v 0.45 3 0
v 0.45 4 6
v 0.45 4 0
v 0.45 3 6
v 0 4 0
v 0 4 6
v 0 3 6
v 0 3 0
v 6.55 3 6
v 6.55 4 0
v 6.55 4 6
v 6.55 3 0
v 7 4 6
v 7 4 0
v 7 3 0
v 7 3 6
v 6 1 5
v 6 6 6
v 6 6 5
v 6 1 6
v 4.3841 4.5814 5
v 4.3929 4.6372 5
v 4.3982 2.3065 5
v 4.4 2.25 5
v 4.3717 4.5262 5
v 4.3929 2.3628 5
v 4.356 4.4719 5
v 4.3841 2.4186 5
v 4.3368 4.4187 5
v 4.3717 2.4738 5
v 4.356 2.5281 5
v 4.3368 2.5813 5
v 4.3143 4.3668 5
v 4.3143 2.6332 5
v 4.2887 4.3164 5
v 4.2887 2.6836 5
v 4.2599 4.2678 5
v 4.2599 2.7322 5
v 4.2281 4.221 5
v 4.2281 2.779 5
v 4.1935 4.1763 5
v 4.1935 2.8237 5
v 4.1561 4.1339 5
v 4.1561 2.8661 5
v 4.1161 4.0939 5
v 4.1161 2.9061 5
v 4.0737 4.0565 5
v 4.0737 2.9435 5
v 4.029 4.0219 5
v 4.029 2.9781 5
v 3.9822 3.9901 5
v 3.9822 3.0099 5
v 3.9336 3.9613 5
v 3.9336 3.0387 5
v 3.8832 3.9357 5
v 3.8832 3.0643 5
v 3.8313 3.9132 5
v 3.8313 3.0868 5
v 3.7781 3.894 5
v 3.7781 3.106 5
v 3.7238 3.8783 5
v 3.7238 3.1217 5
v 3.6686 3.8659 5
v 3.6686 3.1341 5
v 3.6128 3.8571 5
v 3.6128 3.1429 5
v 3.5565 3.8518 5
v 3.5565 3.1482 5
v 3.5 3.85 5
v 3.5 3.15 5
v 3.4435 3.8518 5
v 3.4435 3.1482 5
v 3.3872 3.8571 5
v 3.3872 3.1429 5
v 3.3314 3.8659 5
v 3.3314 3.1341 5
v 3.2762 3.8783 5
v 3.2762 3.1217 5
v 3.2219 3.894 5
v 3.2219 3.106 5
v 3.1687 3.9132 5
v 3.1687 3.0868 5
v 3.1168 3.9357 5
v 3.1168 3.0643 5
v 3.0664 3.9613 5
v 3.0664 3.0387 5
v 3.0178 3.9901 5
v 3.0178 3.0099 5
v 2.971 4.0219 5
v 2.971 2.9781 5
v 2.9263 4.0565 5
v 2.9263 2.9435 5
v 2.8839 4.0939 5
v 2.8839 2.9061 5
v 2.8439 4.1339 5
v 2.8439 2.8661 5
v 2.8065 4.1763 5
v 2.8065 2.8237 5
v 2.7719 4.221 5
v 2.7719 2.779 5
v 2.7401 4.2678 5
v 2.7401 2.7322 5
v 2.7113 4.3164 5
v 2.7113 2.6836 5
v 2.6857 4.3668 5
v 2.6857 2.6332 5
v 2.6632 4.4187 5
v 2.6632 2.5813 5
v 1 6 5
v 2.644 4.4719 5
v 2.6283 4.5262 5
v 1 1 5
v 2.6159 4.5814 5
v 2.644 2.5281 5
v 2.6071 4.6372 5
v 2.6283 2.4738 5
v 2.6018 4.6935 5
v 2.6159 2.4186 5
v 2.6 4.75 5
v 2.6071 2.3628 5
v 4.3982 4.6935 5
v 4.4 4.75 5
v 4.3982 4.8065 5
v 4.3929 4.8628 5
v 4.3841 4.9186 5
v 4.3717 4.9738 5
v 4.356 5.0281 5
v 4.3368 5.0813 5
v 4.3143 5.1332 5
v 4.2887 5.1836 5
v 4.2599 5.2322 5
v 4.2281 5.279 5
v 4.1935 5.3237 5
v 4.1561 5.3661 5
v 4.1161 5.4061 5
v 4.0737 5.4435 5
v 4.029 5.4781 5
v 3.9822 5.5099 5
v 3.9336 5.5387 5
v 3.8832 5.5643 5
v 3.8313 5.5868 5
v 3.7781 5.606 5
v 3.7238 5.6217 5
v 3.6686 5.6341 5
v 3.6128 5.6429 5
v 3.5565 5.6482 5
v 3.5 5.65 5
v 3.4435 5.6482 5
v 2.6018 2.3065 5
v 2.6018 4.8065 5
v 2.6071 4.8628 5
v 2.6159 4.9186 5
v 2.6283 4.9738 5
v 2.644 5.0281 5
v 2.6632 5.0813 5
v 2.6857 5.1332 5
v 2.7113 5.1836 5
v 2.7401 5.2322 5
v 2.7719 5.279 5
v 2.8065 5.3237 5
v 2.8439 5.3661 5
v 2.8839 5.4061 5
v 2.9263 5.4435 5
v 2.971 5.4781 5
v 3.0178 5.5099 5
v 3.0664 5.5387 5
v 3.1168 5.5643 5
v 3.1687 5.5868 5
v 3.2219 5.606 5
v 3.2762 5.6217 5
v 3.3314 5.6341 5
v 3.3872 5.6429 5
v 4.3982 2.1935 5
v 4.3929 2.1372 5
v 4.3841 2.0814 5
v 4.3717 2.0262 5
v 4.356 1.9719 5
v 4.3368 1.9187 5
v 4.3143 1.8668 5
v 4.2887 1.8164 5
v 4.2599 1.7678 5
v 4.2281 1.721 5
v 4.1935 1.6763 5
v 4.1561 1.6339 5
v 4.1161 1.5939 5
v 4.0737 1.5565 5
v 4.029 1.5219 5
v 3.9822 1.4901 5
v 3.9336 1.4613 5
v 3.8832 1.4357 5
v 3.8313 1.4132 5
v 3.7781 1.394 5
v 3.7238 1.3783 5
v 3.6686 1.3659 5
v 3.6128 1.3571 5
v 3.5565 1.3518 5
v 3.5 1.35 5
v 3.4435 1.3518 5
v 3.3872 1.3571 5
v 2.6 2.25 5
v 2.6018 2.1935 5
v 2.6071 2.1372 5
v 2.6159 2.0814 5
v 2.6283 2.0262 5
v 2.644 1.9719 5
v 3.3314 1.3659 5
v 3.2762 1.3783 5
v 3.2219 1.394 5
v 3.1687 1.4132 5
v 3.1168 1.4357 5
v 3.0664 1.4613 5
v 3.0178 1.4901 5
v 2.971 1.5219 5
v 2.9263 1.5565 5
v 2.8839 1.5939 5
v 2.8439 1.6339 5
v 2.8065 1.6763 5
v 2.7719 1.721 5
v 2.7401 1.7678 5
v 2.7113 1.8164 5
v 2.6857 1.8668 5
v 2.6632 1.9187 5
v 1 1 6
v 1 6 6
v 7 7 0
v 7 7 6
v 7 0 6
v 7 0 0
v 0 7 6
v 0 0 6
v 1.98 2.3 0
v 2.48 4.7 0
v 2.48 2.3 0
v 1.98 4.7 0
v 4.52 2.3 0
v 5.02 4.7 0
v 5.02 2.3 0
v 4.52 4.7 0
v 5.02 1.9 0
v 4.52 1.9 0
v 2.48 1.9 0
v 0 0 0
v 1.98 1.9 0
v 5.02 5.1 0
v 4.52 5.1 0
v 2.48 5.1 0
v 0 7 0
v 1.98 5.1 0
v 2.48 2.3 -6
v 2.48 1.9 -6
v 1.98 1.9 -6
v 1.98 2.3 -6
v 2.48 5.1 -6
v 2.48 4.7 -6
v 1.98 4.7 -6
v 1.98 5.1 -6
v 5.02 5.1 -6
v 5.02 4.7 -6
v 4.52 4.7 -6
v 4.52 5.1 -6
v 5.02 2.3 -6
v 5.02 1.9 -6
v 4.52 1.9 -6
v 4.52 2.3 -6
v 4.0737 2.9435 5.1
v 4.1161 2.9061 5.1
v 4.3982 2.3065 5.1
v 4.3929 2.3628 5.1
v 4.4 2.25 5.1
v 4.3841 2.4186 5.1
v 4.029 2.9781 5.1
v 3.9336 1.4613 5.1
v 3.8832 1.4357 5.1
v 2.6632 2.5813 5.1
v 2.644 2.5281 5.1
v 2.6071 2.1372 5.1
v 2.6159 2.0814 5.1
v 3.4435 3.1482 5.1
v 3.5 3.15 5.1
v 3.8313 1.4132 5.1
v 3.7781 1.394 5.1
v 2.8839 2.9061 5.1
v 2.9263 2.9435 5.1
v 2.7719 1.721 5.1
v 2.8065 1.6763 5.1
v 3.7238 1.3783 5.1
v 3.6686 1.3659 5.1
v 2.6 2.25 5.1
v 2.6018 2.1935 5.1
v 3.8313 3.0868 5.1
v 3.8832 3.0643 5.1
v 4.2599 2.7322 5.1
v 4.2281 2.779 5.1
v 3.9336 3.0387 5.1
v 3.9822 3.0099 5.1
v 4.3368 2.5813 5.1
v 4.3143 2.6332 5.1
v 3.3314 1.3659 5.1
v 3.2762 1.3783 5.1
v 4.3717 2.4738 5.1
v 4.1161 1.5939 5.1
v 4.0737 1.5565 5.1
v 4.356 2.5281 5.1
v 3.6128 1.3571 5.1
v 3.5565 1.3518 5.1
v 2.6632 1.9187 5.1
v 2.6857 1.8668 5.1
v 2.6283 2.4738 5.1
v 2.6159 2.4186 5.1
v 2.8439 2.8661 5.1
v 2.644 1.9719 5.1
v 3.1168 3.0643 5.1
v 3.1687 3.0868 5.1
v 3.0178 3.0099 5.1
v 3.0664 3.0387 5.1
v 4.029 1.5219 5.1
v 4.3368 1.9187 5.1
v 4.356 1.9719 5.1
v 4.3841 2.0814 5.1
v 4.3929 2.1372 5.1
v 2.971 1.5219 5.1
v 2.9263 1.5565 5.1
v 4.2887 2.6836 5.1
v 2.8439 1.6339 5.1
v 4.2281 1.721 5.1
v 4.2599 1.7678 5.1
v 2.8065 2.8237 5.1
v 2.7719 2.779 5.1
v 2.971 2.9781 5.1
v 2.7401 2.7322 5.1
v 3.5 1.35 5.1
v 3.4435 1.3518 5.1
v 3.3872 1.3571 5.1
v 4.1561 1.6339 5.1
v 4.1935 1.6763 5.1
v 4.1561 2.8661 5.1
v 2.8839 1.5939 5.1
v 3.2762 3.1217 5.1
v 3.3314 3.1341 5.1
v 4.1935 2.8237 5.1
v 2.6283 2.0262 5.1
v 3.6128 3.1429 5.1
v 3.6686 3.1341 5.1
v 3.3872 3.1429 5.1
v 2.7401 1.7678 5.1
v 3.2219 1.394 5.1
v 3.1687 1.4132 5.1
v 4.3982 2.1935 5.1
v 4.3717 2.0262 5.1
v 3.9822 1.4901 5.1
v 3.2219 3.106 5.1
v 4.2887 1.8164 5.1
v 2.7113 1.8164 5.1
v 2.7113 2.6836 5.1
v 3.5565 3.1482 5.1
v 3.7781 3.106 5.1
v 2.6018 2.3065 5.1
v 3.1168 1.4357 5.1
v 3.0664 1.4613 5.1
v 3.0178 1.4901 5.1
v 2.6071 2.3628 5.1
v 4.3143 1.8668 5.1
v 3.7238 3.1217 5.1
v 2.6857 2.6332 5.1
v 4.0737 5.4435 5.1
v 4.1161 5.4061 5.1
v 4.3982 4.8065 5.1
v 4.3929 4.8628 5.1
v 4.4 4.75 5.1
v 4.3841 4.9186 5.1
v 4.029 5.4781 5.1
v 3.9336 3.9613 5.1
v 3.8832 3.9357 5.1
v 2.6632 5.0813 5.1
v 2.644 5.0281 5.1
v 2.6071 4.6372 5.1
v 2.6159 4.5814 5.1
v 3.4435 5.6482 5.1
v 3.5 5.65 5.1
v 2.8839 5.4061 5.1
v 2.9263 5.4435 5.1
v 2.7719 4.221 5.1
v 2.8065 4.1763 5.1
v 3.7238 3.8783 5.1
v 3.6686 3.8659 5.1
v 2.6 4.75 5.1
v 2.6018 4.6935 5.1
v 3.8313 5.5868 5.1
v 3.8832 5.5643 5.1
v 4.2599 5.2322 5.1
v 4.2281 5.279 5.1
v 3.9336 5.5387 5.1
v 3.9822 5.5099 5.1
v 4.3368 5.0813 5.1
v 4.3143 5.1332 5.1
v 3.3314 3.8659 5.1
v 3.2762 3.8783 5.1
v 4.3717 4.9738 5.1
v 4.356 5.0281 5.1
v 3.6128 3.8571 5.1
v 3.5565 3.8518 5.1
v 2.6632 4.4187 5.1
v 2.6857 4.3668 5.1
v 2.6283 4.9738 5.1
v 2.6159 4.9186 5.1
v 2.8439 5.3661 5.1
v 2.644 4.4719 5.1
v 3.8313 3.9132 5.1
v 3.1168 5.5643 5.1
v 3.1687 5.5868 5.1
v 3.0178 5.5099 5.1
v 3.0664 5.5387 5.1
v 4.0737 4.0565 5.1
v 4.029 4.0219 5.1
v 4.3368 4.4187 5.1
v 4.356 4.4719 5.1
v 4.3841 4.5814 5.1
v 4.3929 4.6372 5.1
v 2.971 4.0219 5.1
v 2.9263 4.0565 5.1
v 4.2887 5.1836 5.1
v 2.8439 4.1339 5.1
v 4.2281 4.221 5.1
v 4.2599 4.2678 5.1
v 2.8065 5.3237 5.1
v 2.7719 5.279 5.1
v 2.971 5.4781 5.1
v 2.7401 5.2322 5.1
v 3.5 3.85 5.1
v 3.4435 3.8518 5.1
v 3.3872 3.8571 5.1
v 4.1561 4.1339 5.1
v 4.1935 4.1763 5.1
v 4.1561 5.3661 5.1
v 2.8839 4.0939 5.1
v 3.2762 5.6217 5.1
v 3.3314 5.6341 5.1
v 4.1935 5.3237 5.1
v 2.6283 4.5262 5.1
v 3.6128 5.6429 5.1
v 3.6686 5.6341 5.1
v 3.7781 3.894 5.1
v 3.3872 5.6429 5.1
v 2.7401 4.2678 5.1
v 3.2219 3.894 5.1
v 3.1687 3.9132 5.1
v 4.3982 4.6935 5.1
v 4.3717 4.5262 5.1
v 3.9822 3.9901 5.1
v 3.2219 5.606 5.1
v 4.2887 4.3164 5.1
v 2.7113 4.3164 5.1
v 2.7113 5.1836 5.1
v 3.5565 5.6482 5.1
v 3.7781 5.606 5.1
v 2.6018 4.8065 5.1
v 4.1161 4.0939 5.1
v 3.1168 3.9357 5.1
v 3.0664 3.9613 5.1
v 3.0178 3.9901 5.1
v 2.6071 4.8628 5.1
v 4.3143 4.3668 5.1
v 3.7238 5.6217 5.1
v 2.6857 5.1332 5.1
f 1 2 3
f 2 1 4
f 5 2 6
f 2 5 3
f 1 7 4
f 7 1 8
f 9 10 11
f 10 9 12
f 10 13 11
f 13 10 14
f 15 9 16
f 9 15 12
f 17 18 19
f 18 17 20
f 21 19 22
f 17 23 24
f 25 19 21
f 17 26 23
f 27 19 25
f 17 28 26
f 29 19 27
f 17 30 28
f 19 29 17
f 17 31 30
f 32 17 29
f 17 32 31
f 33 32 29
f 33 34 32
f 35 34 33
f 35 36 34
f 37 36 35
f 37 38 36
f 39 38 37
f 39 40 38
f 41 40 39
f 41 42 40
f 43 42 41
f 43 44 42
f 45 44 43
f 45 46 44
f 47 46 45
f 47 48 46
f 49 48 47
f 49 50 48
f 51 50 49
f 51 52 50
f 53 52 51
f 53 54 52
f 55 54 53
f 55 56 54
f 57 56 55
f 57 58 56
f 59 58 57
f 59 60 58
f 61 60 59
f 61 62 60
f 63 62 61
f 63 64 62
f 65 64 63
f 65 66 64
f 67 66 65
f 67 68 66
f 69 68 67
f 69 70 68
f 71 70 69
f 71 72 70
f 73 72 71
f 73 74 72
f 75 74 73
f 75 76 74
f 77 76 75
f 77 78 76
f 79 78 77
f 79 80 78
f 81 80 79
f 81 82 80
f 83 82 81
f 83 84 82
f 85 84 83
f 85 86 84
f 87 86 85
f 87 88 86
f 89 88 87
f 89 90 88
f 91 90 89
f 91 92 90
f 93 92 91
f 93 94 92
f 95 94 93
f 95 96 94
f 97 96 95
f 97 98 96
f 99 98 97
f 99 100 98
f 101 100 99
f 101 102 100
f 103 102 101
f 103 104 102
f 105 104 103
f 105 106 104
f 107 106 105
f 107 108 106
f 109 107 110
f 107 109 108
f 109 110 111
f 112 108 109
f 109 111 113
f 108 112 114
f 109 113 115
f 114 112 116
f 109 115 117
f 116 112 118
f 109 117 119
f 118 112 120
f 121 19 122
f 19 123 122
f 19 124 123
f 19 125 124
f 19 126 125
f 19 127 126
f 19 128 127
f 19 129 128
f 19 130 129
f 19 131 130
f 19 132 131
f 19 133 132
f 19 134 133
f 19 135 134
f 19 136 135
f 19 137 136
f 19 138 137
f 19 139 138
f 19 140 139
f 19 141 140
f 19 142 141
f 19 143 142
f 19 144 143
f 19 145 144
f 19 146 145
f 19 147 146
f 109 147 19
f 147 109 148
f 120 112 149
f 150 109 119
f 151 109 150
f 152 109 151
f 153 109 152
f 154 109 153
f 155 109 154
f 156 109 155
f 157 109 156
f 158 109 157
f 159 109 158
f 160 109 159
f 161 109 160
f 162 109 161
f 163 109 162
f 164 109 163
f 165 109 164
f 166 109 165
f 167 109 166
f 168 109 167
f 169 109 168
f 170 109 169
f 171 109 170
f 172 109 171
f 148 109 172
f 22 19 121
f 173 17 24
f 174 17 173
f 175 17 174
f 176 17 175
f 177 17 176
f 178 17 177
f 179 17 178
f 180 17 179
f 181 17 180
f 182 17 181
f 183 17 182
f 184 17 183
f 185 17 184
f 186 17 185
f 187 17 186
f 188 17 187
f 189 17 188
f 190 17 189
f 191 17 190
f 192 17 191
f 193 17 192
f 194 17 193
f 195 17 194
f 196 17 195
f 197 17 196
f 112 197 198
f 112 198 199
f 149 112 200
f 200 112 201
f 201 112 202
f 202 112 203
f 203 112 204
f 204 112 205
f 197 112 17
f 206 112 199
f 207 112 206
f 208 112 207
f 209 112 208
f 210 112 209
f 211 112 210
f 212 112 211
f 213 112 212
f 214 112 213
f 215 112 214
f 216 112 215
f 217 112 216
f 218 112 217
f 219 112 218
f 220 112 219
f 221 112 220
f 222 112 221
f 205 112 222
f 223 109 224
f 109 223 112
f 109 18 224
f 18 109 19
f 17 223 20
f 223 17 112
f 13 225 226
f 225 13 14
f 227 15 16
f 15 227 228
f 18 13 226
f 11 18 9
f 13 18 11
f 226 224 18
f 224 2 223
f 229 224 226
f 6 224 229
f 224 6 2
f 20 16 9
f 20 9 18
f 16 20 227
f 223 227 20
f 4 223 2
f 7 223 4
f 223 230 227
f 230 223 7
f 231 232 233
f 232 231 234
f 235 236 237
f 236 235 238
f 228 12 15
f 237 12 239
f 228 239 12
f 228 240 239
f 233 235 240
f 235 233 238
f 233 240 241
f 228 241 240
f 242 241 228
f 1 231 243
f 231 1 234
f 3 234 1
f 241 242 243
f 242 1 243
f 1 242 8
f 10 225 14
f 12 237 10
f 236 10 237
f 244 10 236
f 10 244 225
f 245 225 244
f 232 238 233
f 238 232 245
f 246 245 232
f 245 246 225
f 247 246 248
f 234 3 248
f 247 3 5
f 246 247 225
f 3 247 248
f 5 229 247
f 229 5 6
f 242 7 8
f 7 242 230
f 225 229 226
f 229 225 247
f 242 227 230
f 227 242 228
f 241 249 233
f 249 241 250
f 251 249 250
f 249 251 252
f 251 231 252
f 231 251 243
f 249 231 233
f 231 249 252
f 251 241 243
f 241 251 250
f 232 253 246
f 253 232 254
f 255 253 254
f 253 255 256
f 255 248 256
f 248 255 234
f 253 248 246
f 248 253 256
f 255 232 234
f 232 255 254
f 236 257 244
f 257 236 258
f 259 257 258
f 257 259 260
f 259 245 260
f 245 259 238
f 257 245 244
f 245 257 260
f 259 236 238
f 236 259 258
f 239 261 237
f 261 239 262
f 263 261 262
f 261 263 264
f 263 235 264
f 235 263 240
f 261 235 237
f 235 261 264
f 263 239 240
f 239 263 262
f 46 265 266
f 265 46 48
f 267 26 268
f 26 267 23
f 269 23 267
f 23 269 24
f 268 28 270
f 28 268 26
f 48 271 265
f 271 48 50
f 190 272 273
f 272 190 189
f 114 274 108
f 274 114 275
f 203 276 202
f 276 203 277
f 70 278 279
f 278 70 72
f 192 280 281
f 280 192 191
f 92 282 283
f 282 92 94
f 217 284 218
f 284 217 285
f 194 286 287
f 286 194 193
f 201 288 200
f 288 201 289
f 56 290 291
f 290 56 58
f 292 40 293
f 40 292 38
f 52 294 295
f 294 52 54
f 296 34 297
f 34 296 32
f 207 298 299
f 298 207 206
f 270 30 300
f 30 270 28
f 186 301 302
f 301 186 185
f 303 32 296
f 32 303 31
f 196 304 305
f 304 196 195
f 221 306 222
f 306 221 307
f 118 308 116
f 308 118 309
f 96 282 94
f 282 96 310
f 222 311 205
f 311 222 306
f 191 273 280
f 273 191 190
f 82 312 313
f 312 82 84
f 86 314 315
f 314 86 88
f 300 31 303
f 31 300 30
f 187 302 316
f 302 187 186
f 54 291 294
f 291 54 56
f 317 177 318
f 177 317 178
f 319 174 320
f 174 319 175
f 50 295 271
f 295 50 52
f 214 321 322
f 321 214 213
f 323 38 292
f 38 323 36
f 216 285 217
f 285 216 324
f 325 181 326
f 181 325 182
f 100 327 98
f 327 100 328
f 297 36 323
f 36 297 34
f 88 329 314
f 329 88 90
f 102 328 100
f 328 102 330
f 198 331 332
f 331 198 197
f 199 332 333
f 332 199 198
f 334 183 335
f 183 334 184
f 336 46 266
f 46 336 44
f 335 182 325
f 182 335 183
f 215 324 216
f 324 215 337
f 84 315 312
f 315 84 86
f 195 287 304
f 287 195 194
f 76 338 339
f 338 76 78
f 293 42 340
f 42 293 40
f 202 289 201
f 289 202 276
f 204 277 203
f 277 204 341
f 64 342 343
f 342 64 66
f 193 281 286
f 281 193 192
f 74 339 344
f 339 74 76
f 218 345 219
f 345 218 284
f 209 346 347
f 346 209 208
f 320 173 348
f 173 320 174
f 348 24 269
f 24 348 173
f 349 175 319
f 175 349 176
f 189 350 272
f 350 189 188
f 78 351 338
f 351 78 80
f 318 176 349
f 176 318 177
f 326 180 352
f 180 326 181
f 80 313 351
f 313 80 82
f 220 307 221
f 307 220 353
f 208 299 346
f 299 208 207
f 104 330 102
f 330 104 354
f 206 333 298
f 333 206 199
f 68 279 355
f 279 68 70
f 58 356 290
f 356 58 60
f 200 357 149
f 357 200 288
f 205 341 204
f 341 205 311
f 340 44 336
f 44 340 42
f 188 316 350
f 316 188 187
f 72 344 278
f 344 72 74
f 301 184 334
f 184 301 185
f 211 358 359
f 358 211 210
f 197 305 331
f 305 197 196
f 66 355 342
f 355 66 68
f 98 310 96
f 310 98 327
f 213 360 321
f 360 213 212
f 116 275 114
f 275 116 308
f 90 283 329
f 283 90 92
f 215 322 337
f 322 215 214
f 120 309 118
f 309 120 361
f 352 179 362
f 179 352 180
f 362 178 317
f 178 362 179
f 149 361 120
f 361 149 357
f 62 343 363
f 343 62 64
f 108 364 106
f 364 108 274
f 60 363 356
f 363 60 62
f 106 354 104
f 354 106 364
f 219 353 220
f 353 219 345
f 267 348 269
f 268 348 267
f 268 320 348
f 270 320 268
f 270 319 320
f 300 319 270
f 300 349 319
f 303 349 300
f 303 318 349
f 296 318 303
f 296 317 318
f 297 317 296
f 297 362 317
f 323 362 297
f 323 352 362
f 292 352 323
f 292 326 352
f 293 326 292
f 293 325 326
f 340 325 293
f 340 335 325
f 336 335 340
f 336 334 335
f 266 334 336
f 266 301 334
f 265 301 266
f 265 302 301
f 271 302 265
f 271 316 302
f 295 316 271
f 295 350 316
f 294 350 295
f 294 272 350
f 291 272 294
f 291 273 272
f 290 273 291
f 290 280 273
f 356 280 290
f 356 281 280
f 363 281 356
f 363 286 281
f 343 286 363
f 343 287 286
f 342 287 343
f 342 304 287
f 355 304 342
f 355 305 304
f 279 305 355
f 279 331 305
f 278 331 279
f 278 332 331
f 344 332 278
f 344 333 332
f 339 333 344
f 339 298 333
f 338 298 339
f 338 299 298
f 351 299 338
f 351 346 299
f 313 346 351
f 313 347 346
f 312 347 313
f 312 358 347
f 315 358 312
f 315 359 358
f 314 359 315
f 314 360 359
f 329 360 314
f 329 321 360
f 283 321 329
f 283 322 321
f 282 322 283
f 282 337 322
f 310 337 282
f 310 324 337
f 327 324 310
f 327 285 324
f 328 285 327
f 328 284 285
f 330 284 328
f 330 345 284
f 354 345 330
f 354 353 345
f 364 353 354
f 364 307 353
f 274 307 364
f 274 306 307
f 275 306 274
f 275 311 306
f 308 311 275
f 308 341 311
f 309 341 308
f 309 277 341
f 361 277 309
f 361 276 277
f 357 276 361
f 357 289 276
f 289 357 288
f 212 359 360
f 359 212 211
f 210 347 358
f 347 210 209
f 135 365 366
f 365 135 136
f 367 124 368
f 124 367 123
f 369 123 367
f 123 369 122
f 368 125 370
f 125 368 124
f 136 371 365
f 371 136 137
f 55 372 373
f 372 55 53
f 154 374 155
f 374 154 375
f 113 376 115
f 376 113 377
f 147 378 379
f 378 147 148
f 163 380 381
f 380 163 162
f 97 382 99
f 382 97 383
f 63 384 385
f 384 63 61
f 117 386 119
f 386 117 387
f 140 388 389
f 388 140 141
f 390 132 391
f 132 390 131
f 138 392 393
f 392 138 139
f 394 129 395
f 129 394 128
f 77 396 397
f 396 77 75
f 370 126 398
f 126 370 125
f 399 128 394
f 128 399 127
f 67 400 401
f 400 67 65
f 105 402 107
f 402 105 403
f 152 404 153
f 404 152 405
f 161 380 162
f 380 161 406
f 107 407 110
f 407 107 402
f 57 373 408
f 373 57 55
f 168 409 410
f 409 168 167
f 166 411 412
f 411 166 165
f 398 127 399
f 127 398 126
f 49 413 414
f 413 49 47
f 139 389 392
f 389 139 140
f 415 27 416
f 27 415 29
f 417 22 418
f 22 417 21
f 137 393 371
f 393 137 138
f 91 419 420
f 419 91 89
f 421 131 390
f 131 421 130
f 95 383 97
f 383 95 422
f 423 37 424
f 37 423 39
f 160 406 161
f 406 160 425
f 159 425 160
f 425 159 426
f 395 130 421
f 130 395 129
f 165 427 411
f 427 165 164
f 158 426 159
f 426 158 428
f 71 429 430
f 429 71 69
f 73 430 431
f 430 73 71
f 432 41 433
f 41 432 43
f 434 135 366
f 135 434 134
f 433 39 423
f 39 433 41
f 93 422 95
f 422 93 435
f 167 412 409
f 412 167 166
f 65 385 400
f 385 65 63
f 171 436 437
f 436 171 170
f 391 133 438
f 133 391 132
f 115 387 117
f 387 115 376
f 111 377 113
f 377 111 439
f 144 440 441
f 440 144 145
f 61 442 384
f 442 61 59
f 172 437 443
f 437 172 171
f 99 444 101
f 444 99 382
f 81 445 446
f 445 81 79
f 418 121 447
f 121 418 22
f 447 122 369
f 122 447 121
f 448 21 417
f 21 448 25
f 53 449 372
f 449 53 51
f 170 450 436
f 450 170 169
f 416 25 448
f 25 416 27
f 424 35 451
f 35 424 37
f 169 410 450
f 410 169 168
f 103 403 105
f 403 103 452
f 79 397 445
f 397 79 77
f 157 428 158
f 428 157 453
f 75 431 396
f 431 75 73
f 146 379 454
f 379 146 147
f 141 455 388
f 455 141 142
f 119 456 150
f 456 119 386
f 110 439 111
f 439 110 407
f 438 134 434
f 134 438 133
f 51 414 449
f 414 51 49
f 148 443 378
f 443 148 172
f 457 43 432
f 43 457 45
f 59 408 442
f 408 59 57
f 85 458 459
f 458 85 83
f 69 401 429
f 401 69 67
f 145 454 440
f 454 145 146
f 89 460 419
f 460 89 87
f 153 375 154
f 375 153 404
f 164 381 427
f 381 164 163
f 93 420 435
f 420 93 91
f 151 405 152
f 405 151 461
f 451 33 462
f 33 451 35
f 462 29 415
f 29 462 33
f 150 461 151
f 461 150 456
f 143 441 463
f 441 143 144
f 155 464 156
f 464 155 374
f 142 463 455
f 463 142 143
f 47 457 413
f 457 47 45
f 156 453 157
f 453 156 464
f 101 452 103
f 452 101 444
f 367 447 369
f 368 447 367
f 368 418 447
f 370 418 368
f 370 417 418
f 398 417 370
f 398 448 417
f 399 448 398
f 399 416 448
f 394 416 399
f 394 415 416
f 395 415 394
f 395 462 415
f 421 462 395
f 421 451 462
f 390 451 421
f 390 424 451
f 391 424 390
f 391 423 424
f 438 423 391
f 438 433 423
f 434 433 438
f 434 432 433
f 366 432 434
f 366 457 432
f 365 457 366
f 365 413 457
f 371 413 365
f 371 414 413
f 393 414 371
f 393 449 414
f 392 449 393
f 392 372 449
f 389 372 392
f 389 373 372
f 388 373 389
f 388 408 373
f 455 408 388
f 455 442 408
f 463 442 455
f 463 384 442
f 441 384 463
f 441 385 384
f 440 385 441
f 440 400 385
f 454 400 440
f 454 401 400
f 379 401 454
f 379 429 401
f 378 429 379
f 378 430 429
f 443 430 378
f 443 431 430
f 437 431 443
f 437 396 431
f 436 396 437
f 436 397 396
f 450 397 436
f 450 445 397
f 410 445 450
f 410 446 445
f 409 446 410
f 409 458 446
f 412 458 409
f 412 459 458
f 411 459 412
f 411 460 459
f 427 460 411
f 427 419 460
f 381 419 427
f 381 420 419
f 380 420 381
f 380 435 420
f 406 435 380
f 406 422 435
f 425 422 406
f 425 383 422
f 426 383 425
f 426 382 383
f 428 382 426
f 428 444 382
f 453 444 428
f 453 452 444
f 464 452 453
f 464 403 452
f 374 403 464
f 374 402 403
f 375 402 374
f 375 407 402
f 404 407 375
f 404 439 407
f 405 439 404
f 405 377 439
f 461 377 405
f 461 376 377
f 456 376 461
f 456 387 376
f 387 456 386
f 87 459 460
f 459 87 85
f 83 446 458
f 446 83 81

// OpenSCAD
$fn=100;

module CNY70(){
	difference(){
		color("midnightBlue")cube([7,7,6]);
		color("midnightBlue")union(){
			translate([-0.1,3,-0.1])cube([1.1/2,1,6.2]);
			translate([7.1-1.1/2,3,-0.1])cube([1.1/2,1,6.2]);
			translate([1,1,5])cube([5,5,1.1]);
		}
	}
	translate([(7-3.04)/2,(7-3.2)/2,0]){
		color("khaki"){translate([0,0,-6])cube([0.5,0.4,6]);
		translate([0,2.8,-6])cube([0.5,0.4,6]);
		translate([2.54,2.8,-6])cube([0.5,0.4,6]);
		translate([2.54,0,-6])cube([0.5,0.4,6]);
		}
	}
	color("black")translate([3.5,3.5-1.8/2-(2.5-1.8)/2,5])cylinder(d=1.8,h=0.1); // emitter
	color("silver")translate([3.5,3.5+1.8/2+(2.5-1.8)/2,5])cylinder(d=1.8,h=0.1);		// detector
}

CNY70();
